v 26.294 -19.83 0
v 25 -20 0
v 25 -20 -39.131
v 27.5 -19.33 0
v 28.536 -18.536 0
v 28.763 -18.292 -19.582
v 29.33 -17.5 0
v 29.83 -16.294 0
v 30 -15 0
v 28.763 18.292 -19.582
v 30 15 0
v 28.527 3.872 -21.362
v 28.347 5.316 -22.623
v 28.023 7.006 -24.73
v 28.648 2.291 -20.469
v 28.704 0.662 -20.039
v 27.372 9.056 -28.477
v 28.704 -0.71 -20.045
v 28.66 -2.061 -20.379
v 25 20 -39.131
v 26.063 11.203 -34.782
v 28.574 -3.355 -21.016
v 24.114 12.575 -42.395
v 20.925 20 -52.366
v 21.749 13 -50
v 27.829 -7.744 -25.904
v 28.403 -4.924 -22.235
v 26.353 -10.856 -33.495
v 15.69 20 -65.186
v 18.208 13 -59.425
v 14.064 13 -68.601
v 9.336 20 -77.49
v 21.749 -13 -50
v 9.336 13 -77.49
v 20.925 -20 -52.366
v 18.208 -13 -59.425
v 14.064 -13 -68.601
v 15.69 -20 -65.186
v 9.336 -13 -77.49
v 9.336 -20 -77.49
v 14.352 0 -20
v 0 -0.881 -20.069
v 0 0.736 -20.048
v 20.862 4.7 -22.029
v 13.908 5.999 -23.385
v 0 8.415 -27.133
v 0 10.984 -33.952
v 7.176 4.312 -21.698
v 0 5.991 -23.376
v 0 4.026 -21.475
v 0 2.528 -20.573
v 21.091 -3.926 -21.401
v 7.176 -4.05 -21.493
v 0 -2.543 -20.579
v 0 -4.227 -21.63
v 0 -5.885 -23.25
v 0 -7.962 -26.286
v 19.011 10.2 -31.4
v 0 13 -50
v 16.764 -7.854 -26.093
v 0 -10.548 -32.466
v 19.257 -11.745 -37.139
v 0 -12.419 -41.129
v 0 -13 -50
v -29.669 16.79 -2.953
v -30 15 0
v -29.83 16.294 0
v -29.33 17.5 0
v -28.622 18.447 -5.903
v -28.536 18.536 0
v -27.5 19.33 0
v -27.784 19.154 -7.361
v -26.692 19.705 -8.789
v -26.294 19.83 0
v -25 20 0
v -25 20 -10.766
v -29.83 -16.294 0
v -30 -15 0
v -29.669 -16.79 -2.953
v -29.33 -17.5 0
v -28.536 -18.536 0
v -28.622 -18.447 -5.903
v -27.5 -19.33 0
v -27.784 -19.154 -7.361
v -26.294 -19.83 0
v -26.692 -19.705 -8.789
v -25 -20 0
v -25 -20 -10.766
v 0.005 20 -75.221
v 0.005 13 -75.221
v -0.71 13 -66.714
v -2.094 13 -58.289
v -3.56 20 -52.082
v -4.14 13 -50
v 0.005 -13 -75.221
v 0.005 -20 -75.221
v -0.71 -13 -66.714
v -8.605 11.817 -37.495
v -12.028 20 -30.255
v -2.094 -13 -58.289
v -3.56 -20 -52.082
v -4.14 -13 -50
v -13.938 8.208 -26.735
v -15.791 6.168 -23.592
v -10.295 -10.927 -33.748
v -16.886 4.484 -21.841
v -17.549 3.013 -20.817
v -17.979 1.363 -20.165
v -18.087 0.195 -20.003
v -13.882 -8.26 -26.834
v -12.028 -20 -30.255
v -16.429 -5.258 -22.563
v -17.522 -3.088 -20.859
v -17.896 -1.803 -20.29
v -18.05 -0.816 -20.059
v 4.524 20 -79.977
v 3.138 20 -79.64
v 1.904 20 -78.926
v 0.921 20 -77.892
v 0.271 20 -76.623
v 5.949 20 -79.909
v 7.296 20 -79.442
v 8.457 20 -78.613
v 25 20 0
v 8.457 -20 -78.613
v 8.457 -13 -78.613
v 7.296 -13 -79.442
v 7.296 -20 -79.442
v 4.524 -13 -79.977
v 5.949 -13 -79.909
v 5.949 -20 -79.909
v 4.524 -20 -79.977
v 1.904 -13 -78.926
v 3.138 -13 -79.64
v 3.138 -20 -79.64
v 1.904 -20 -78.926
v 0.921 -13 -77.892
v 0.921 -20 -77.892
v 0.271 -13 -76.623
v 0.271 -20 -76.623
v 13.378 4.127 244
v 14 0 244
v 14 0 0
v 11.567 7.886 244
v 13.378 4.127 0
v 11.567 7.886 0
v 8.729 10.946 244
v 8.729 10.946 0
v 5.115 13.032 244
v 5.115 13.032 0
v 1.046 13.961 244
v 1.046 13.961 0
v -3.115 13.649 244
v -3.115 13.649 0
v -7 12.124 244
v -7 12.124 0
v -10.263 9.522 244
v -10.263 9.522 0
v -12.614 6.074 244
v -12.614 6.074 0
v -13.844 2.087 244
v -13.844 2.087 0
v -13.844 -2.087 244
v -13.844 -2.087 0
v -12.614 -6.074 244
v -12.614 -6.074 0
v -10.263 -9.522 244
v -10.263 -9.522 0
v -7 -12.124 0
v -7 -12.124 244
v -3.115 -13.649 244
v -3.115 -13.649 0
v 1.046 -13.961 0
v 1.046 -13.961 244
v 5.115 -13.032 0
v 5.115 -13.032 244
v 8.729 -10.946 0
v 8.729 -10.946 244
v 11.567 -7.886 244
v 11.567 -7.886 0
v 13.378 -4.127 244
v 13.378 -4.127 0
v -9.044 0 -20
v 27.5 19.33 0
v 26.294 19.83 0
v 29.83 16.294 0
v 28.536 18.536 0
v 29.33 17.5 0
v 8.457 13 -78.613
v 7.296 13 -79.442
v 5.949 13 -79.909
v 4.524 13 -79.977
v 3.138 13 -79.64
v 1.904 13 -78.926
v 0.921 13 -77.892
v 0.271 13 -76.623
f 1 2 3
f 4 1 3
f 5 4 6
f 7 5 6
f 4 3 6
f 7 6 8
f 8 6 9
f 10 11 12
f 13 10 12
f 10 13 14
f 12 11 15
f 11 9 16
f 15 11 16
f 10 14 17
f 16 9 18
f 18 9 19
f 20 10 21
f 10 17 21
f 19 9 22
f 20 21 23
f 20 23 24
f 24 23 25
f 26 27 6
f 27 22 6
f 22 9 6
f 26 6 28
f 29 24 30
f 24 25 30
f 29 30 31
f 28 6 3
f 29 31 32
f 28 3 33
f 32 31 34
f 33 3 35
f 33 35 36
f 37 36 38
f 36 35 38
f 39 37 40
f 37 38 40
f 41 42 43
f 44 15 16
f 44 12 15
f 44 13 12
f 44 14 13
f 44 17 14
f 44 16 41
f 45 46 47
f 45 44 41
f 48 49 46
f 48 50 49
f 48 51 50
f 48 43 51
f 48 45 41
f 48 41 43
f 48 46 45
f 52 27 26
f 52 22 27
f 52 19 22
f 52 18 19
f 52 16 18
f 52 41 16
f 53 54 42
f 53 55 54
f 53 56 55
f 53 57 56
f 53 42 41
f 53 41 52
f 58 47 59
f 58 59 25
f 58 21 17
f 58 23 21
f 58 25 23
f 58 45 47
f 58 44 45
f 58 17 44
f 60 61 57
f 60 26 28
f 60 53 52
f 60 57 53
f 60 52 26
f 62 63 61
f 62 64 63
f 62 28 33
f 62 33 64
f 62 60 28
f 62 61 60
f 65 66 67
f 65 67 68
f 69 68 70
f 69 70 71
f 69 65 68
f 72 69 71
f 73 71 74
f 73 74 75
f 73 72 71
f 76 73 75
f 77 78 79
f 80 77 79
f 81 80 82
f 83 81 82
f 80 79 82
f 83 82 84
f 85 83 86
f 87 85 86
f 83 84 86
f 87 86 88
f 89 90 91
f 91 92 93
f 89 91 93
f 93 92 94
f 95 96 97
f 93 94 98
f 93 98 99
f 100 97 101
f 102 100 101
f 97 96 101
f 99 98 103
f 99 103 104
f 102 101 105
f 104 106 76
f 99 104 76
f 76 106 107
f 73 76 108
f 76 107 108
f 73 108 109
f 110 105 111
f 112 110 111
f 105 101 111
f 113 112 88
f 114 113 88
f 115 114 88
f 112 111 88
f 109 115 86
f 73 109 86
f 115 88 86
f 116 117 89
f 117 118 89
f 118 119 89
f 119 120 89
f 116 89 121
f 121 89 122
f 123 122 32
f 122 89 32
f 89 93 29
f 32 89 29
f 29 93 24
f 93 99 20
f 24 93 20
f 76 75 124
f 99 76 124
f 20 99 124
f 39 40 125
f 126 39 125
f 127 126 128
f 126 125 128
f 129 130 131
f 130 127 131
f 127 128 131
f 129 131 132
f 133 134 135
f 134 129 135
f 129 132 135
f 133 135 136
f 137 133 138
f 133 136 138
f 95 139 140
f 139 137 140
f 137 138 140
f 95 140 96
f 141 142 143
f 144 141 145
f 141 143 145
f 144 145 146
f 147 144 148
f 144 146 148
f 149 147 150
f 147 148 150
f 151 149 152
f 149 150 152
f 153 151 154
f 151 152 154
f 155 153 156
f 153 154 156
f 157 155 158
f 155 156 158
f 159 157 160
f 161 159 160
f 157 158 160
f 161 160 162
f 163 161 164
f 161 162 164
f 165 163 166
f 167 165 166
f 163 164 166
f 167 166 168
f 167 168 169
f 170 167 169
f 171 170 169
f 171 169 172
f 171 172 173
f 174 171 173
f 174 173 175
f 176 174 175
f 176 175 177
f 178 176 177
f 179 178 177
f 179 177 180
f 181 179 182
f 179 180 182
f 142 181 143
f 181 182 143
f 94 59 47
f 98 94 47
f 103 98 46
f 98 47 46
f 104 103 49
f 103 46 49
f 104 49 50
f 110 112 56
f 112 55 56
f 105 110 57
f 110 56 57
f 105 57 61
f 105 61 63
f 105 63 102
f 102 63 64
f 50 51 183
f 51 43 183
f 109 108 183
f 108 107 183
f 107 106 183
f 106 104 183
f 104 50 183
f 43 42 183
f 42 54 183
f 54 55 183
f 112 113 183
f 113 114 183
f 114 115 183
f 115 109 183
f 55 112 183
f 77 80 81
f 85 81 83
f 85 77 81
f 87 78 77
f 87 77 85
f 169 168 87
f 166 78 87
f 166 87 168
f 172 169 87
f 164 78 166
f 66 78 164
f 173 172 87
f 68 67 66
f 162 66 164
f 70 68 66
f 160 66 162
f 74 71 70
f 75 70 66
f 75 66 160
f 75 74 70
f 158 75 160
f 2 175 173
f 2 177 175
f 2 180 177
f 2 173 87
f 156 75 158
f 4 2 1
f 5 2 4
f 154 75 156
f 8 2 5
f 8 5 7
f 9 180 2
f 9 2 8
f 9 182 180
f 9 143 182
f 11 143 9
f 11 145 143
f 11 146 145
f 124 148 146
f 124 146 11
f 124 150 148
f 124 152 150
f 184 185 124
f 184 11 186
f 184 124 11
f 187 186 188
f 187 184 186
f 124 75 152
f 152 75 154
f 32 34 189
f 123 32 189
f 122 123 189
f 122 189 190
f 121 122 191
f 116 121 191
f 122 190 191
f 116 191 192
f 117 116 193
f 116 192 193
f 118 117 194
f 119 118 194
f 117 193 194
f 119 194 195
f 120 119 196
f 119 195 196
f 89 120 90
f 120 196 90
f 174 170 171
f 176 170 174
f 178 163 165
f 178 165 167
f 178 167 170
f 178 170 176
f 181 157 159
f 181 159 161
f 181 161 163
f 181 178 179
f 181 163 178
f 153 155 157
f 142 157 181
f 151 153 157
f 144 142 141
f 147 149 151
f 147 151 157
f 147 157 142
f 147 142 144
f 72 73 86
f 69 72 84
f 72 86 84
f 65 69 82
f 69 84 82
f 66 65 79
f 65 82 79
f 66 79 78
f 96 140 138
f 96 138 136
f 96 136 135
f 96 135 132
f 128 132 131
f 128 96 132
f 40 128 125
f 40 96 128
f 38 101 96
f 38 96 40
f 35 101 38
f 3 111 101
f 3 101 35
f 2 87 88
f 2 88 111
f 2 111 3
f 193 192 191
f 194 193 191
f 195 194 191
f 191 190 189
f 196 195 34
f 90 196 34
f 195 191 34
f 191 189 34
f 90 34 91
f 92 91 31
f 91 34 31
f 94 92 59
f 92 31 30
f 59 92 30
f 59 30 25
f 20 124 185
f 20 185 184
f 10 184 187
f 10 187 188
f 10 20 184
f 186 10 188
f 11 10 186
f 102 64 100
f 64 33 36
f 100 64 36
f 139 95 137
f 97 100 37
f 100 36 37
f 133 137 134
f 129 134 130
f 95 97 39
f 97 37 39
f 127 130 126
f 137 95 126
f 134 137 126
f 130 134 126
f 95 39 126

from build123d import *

# Parameters (mm, degrees)
F0_R     = 14
F1_DEPTH = 244
F2_W     = 60
F2_H     = 40
F3_DEPTH = 80
F4_R     = 5
F6_DEPTH = 40
F8_DEPTH = 35


with BuildPart() as f1:
    # F0 (on Top) → F1 (new body)
    with BuildSketch(Plane.XY):
        Circle(F0_R)
    extrude(amount=F1_DEPTH)

    # F2 (on Top) → F3 (join)
    with BuildSketch(Plane.XY):
        Rectangle(F2_W, F2_H)
    extrude(amount=-F3_DEPTH)

    # F4
    f4_edges = [f1.edges().sort_by_distance(p)[0] for p in [
        (30, -20, -40),
        (-30, -20, -40),
        (30, 20, -40),
        (-30, 20, -40),
    ]]
    fillet(f4_edges, radius=F4_R)

    # F5 (on Front) → F6 (cut, symmetric)
    with BuildSketch(Plane.XZ):
        with BuildLine():
            Line((-30, 0), (-30, -90))
            Line((-30, -90), (30, -90))
            Line((30, -90), (30, 0))
            ThreePointArc((30, 0), (24.7453124754, -40.0987499935), (9.3360995851, -77.489626556))
            ThreePointArc((9.3360995851, -77.489626556), (3.8189128101, -79.8585011114), (0.0048970649, -75.2212389381))
            ThreePointArc((0.0048970649, -75.2212389381), (-7.6784593534, -39.7286436891), (-26.6918835796, -8.7892192835))
            ThreePointArc((-26.6918835796, -8.7892192835), (-29.1455882011, -4.6955832935), (-30, 0))
        make_face()
    extrude(amount=F6_DEPTH, both=True, mode=Mode.SUBTRACT)

    # F7 (on Right) → F8 (cut, symmetric)
    with BuildSketch(Plane.YZ):
        with BuildLine():
            Line((13, -80), (13, -50))
            add(Edge.make_bspline(
                [(13, -50), (13, -20), (0, -20), (-13, -20), (-13, -50)],
                knots=[1.5707963268, 1.5707963268, 1.5707963268, 3.1415926536, 3.1415926536, 4.7123889804, 4.7123889804, 4.7123889804], degree=2, weights=[1, 0.7071067812, 1, 0.7071067812, 1]))
            Line((-13, -50), (-13, -80))
            Line((-13, -80), (13, -80))
        make_face()
    extrude(amount=F8_DEPTH, both=True, mode=Mode.SUBTRACT)


solid = f1.part
